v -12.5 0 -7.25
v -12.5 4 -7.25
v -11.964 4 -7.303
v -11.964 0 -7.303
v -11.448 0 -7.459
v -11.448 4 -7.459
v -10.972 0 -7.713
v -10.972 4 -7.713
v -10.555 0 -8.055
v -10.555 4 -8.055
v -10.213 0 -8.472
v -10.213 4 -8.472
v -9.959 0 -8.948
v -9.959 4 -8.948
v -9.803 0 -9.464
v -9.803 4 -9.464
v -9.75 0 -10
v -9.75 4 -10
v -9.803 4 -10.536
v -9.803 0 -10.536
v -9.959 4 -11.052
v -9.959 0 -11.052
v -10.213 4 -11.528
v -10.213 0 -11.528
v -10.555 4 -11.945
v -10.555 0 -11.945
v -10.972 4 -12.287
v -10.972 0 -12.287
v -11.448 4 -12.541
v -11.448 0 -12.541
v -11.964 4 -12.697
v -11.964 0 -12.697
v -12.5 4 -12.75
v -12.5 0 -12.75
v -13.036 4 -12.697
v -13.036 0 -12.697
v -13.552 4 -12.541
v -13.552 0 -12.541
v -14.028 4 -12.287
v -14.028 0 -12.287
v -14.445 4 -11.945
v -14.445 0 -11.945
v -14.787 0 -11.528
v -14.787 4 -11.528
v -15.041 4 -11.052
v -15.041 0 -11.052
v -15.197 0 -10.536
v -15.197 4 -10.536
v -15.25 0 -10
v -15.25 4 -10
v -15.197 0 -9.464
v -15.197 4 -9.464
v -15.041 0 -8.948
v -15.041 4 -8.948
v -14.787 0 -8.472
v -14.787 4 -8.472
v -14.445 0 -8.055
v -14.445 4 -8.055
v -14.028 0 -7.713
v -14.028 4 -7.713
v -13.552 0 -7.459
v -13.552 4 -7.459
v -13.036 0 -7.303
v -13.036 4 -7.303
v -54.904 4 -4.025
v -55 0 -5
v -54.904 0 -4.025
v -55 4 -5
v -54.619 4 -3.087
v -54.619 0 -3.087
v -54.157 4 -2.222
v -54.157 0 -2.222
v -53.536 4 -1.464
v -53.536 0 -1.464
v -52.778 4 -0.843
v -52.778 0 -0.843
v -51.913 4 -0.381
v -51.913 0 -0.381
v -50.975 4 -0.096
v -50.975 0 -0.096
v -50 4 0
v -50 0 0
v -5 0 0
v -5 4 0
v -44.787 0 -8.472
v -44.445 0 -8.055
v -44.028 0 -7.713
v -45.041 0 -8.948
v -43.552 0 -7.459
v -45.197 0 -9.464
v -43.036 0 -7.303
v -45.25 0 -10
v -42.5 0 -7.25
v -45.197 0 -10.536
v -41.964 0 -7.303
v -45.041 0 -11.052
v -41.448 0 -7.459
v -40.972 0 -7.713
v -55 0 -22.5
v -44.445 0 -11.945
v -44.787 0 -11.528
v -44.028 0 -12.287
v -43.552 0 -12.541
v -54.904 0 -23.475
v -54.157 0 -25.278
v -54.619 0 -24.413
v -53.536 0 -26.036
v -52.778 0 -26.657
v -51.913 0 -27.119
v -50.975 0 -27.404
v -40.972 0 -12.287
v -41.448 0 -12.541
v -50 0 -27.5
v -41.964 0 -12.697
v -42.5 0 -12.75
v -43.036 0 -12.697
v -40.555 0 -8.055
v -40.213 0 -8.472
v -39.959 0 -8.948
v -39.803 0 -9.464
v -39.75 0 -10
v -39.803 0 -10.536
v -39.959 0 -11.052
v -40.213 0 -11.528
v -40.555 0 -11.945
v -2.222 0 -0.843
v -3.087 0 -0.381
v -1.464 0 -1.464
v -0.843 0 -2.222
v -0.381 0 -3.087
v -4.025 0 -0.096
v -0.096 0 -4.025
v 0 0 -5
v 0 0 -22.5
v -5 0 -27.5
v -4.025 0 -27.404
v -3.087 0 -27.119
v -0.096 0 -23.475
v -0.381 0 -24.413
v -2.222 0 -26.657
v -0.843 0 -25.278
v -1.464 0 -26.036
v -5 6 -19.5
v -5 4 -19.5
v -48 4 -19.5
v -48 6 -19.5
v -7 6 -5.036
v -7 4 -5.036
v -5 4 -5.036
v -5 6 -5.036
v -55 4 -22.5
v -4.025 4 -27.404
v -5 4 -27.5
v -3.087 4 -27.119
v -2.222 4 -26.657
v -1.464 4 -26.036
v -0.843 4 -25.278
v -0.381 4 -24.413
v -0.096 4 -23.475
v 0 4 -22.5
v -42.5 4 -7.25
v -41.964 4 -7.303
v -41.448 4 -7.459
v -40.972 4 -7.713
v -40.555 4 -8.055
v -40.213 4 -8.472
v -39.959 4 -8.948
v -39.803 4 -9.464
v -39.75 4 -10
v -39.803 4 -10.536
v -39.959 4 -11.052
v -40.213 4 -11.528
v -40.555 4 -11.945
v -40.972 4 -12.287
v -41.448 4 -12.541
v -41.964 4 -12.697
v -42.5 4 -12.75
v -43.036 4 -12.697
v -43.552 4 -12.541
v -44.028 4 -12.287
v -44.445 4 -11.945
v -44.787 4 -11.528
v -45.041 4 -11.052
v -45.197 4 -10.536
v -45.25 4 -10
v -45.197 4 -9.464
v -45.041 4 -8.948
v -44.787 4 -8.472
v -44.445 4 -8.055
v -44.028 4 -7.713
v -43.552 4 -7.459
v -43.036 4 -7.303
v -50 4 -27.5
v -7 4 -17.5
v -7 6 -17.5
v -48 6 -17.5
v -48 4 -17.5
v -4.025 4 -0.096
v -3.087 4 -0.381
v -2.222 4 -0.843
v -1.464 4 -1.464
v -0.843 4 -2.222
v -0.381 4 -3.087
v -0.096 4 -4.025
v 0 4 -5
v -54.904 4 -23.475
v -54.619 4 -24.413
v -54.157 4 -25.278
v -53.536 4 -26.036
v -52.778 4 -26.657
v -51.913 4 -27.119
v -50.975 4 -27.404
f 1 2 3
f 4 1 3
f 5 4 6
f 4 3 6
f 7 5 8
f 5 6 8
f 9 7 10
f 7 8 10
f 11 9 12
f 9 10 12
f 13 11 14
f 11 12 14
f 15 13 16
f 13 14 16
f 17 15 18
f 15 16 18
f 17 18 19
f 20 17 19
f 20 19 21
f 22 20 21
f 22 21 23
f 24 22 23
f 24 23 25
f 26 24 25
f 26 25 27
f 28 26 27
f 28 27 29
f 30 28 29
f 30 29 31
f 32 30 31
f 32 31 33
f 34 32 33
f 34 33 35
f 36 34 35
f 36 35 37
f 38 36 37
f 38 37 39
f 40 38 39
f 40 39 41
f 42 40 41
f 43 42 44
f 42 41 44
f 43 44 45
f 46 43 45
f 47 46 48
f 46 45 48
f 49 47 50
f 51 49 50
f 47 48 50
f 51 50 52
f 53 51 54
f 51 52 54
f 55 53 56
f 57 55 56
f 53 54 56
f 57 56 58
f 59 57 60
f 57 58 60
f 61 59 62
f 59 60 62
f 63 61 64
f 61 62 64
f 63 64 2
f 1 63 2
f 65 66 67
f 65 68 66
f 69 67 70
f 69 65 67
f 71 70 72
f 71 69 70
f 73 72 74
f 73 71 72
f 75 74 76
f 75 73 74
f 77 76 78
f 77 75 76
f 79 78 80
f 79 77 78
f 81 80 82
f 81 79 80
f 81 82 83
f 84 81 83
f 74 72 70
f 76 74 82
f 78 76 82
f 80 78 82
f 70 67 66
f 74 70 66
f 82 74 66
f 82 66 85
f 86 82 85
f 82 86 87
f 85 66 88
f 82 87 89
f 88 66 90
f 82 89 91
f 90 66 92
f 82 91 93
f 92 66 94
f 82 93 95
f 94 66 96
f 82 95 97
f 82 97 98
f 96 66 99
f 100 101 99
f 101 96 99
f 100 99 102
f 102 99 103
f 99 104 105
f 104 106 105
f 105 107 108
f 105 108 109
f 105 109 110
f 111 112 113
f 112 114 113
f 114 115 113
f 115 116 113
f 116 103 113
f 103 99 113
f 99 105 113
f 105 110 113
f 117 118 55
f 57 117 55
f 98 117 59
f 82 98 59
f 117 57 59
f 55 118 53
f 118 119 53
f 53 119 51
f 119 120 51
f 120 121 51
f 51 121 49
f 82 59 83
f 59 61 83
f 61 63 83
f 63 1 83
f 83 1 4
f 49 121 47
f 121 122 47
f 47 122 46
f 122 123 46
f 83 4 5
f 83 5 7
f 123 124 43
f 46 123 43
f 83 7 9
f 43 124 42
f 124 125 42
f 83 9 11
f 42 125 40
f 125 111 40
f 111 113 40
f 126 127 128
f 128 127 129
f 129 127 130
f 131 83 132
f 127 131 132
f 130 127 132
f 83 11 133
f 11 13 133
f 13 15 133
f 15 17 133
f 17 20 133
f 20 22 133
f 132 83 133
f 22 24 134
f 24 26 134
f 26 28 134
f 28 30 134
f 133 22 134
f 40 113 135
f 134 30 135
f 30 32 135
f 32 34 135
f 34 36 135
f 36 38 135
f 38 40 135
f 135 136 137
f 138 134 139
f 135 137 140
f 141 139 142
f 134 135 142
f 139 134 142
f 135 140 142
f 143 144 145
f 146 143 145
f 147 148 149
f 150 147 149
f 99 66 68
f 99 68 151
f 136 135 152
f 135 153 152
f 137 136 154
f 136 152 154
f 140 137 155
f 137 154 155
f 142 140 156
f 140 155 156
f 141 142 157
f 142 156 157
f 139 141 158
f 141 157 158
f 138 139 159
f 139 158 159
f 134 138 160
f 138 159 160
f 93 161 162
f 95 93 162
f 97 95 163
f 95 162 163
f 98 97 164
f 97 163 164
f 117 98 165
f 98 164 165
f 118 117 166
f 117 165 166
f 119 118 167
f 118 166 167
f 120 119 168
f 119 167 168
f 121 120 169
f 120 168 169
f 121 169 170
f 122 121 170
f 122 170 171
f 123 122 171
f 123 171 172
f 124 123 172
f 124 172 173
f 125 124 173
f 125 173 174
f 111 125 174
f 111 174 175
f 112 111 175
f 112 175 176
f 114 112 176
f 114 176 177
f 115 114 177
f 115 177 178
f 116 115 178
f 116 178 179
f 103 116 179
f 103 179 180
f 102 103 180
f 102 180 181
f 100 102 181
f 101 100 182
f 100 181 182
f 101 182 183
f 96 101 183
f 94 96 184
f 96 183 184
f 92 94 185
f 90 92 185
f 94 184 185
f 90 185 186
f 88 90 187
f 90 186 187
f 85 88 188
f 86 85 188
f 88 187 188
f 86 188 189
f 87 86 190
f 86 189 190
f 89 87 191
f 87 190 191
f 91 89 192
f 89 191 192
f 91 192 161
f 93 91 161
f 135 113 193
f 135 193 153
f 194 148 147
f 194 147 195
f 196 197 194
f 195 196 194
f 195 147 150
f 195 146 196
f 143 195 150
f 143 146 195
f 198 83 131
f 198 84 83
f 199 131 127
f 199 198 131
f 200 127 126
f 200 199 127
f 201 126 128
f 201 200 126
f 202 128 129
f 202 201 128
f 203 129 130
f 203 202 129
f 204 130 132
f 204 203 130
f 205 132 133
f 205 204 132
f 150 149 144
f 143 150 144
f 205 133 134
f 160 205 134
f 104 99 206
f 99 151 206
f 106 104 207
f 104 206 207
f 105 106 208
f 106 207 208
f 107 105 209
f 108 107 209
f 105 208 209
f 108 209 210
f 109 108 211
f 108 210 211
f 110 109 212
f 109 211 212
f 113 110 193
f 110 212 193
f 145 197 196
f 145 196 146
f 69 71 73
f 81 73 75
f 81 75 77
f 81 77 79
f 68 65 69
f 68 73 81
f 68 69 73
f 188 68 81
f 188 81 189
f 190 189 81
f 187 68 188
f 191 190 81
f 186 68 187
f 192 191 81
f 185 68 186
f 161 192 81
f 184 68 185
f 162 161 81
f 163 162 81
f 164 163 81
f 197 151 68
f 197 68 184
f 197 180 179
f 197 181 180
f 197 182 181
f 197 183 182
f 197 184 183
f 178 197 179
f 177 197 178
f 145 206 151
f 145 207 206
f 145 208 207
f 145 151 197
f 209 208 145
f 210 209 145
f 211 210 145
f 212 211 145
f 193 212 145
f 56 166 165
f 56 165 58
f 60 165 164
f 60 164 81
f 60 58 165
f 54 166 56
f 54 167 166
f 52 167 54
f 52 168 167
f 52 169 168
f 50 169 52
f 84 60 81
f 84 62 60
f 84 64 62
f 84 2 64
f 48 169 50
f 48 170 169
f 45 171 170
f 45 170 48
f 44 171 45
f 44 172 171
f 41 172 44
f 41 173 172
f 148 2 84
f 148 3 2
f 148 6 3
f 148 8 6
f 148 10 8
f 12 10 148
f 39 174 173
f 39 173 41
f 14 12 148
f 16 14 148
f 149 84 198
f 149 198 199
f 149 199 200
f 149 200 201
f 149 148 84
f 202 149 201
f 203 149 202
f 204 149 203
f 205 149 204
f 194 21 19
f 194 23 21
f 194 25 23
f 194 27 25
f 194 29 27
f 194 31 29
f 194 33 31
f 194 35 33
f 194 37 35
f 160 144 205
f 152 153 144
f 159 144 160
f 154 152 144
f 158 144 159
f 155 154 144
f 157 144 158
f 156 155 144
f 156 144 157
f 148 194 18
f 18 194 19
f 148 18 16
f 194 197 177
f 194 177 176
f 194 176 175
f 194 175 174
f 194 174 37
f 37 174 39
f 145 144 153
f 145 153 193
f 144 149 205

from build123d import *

# Parameters (mm, degrees)
SKETCH_1_W          = 55
SKETCH_1_H          = 27.5
EXTRUDE_1_DEPTH     = 4
SKETCH_2_R          = 2.75
CUT_EXTRUDE_1_DEPTH = 62.621830547
FILLET_1_R          = 5
SKETCH_4_W          = 20.5
SKETCH_4_H          = 2
SKETCH_4_W_2        = 2
SKETCH_4_H_2        = 12.464207651
EXTRUDE_6_DEPTH     = 2


with BuildPart() as part:
    # 草图1 → 凸台-拉伸1 (new body)
    with BuildSketch(Plane(origin=(0, 0, 0), x_dir=(1, 0, 0), z_dir=(0, 1, 0))):
        with Locations((-27.5, 13.75)):
            Rectangle(SKETCH_1_W, SKETCH_1_H)
    extrude(amount=EXTRUDE_1_DEPTH)

    # 草图2 → 切除-拉伸1 (cut, through all)
    with BuildSketch(Plane(origin=(0, 4, 0), x_dir=(1, 0, 0), z_dir=(0, 1, 0))):
        with Locations(Location((-42.5, 10, 0), (0, 0, 270))):
            Circle(SKETCH_2_R)
        with Locations(Location((-12.5, 10, 0), (0, 0, 270))):
            Circle(SKETCH_2_R)
    extrude(amount=-CUT_EXTRUDE_1_DEPTH, mode=Mode.SUBTRACT)

    # 圆角1
    fillet_1_edges = [part.edges().sort_by_distance(p)[0] for p in [
        (0, 2, 0),
        (-55, 2, 0),
        (-55, 2, -27.5),
        (0, 2, -27.5),
    ]]
    fillet(fillet_1_edges, radius=FILLET_1_R)

    # 草图4 → 凸台-拉伸6 (add)
    with BuildSketch(Plane(origin=(0, 4, 0), x_dir=(1, 0, 0), z_dir=(0, 1, 0))):
        with Locations((-17.25, 18.5)):
            Rectangle(SKETCH_4_W, SKETCH_4_H)
        with Locations((-6, 18.5)):
            Rectangle(SKETCH_4_W_2, SKETCH_4_H)
        with Locations((-6, 11.267896175)):
            Rectangle(SKETCH_4_W_2, SKETCH_4_H_2)
        with Locations((-37.75, 18.5)):
            Rectangle(SKETCH_4_W, SKETCH_4_H)
    extrude(amount=EXTRUDE_6_DEPTH)


solid = part.part
